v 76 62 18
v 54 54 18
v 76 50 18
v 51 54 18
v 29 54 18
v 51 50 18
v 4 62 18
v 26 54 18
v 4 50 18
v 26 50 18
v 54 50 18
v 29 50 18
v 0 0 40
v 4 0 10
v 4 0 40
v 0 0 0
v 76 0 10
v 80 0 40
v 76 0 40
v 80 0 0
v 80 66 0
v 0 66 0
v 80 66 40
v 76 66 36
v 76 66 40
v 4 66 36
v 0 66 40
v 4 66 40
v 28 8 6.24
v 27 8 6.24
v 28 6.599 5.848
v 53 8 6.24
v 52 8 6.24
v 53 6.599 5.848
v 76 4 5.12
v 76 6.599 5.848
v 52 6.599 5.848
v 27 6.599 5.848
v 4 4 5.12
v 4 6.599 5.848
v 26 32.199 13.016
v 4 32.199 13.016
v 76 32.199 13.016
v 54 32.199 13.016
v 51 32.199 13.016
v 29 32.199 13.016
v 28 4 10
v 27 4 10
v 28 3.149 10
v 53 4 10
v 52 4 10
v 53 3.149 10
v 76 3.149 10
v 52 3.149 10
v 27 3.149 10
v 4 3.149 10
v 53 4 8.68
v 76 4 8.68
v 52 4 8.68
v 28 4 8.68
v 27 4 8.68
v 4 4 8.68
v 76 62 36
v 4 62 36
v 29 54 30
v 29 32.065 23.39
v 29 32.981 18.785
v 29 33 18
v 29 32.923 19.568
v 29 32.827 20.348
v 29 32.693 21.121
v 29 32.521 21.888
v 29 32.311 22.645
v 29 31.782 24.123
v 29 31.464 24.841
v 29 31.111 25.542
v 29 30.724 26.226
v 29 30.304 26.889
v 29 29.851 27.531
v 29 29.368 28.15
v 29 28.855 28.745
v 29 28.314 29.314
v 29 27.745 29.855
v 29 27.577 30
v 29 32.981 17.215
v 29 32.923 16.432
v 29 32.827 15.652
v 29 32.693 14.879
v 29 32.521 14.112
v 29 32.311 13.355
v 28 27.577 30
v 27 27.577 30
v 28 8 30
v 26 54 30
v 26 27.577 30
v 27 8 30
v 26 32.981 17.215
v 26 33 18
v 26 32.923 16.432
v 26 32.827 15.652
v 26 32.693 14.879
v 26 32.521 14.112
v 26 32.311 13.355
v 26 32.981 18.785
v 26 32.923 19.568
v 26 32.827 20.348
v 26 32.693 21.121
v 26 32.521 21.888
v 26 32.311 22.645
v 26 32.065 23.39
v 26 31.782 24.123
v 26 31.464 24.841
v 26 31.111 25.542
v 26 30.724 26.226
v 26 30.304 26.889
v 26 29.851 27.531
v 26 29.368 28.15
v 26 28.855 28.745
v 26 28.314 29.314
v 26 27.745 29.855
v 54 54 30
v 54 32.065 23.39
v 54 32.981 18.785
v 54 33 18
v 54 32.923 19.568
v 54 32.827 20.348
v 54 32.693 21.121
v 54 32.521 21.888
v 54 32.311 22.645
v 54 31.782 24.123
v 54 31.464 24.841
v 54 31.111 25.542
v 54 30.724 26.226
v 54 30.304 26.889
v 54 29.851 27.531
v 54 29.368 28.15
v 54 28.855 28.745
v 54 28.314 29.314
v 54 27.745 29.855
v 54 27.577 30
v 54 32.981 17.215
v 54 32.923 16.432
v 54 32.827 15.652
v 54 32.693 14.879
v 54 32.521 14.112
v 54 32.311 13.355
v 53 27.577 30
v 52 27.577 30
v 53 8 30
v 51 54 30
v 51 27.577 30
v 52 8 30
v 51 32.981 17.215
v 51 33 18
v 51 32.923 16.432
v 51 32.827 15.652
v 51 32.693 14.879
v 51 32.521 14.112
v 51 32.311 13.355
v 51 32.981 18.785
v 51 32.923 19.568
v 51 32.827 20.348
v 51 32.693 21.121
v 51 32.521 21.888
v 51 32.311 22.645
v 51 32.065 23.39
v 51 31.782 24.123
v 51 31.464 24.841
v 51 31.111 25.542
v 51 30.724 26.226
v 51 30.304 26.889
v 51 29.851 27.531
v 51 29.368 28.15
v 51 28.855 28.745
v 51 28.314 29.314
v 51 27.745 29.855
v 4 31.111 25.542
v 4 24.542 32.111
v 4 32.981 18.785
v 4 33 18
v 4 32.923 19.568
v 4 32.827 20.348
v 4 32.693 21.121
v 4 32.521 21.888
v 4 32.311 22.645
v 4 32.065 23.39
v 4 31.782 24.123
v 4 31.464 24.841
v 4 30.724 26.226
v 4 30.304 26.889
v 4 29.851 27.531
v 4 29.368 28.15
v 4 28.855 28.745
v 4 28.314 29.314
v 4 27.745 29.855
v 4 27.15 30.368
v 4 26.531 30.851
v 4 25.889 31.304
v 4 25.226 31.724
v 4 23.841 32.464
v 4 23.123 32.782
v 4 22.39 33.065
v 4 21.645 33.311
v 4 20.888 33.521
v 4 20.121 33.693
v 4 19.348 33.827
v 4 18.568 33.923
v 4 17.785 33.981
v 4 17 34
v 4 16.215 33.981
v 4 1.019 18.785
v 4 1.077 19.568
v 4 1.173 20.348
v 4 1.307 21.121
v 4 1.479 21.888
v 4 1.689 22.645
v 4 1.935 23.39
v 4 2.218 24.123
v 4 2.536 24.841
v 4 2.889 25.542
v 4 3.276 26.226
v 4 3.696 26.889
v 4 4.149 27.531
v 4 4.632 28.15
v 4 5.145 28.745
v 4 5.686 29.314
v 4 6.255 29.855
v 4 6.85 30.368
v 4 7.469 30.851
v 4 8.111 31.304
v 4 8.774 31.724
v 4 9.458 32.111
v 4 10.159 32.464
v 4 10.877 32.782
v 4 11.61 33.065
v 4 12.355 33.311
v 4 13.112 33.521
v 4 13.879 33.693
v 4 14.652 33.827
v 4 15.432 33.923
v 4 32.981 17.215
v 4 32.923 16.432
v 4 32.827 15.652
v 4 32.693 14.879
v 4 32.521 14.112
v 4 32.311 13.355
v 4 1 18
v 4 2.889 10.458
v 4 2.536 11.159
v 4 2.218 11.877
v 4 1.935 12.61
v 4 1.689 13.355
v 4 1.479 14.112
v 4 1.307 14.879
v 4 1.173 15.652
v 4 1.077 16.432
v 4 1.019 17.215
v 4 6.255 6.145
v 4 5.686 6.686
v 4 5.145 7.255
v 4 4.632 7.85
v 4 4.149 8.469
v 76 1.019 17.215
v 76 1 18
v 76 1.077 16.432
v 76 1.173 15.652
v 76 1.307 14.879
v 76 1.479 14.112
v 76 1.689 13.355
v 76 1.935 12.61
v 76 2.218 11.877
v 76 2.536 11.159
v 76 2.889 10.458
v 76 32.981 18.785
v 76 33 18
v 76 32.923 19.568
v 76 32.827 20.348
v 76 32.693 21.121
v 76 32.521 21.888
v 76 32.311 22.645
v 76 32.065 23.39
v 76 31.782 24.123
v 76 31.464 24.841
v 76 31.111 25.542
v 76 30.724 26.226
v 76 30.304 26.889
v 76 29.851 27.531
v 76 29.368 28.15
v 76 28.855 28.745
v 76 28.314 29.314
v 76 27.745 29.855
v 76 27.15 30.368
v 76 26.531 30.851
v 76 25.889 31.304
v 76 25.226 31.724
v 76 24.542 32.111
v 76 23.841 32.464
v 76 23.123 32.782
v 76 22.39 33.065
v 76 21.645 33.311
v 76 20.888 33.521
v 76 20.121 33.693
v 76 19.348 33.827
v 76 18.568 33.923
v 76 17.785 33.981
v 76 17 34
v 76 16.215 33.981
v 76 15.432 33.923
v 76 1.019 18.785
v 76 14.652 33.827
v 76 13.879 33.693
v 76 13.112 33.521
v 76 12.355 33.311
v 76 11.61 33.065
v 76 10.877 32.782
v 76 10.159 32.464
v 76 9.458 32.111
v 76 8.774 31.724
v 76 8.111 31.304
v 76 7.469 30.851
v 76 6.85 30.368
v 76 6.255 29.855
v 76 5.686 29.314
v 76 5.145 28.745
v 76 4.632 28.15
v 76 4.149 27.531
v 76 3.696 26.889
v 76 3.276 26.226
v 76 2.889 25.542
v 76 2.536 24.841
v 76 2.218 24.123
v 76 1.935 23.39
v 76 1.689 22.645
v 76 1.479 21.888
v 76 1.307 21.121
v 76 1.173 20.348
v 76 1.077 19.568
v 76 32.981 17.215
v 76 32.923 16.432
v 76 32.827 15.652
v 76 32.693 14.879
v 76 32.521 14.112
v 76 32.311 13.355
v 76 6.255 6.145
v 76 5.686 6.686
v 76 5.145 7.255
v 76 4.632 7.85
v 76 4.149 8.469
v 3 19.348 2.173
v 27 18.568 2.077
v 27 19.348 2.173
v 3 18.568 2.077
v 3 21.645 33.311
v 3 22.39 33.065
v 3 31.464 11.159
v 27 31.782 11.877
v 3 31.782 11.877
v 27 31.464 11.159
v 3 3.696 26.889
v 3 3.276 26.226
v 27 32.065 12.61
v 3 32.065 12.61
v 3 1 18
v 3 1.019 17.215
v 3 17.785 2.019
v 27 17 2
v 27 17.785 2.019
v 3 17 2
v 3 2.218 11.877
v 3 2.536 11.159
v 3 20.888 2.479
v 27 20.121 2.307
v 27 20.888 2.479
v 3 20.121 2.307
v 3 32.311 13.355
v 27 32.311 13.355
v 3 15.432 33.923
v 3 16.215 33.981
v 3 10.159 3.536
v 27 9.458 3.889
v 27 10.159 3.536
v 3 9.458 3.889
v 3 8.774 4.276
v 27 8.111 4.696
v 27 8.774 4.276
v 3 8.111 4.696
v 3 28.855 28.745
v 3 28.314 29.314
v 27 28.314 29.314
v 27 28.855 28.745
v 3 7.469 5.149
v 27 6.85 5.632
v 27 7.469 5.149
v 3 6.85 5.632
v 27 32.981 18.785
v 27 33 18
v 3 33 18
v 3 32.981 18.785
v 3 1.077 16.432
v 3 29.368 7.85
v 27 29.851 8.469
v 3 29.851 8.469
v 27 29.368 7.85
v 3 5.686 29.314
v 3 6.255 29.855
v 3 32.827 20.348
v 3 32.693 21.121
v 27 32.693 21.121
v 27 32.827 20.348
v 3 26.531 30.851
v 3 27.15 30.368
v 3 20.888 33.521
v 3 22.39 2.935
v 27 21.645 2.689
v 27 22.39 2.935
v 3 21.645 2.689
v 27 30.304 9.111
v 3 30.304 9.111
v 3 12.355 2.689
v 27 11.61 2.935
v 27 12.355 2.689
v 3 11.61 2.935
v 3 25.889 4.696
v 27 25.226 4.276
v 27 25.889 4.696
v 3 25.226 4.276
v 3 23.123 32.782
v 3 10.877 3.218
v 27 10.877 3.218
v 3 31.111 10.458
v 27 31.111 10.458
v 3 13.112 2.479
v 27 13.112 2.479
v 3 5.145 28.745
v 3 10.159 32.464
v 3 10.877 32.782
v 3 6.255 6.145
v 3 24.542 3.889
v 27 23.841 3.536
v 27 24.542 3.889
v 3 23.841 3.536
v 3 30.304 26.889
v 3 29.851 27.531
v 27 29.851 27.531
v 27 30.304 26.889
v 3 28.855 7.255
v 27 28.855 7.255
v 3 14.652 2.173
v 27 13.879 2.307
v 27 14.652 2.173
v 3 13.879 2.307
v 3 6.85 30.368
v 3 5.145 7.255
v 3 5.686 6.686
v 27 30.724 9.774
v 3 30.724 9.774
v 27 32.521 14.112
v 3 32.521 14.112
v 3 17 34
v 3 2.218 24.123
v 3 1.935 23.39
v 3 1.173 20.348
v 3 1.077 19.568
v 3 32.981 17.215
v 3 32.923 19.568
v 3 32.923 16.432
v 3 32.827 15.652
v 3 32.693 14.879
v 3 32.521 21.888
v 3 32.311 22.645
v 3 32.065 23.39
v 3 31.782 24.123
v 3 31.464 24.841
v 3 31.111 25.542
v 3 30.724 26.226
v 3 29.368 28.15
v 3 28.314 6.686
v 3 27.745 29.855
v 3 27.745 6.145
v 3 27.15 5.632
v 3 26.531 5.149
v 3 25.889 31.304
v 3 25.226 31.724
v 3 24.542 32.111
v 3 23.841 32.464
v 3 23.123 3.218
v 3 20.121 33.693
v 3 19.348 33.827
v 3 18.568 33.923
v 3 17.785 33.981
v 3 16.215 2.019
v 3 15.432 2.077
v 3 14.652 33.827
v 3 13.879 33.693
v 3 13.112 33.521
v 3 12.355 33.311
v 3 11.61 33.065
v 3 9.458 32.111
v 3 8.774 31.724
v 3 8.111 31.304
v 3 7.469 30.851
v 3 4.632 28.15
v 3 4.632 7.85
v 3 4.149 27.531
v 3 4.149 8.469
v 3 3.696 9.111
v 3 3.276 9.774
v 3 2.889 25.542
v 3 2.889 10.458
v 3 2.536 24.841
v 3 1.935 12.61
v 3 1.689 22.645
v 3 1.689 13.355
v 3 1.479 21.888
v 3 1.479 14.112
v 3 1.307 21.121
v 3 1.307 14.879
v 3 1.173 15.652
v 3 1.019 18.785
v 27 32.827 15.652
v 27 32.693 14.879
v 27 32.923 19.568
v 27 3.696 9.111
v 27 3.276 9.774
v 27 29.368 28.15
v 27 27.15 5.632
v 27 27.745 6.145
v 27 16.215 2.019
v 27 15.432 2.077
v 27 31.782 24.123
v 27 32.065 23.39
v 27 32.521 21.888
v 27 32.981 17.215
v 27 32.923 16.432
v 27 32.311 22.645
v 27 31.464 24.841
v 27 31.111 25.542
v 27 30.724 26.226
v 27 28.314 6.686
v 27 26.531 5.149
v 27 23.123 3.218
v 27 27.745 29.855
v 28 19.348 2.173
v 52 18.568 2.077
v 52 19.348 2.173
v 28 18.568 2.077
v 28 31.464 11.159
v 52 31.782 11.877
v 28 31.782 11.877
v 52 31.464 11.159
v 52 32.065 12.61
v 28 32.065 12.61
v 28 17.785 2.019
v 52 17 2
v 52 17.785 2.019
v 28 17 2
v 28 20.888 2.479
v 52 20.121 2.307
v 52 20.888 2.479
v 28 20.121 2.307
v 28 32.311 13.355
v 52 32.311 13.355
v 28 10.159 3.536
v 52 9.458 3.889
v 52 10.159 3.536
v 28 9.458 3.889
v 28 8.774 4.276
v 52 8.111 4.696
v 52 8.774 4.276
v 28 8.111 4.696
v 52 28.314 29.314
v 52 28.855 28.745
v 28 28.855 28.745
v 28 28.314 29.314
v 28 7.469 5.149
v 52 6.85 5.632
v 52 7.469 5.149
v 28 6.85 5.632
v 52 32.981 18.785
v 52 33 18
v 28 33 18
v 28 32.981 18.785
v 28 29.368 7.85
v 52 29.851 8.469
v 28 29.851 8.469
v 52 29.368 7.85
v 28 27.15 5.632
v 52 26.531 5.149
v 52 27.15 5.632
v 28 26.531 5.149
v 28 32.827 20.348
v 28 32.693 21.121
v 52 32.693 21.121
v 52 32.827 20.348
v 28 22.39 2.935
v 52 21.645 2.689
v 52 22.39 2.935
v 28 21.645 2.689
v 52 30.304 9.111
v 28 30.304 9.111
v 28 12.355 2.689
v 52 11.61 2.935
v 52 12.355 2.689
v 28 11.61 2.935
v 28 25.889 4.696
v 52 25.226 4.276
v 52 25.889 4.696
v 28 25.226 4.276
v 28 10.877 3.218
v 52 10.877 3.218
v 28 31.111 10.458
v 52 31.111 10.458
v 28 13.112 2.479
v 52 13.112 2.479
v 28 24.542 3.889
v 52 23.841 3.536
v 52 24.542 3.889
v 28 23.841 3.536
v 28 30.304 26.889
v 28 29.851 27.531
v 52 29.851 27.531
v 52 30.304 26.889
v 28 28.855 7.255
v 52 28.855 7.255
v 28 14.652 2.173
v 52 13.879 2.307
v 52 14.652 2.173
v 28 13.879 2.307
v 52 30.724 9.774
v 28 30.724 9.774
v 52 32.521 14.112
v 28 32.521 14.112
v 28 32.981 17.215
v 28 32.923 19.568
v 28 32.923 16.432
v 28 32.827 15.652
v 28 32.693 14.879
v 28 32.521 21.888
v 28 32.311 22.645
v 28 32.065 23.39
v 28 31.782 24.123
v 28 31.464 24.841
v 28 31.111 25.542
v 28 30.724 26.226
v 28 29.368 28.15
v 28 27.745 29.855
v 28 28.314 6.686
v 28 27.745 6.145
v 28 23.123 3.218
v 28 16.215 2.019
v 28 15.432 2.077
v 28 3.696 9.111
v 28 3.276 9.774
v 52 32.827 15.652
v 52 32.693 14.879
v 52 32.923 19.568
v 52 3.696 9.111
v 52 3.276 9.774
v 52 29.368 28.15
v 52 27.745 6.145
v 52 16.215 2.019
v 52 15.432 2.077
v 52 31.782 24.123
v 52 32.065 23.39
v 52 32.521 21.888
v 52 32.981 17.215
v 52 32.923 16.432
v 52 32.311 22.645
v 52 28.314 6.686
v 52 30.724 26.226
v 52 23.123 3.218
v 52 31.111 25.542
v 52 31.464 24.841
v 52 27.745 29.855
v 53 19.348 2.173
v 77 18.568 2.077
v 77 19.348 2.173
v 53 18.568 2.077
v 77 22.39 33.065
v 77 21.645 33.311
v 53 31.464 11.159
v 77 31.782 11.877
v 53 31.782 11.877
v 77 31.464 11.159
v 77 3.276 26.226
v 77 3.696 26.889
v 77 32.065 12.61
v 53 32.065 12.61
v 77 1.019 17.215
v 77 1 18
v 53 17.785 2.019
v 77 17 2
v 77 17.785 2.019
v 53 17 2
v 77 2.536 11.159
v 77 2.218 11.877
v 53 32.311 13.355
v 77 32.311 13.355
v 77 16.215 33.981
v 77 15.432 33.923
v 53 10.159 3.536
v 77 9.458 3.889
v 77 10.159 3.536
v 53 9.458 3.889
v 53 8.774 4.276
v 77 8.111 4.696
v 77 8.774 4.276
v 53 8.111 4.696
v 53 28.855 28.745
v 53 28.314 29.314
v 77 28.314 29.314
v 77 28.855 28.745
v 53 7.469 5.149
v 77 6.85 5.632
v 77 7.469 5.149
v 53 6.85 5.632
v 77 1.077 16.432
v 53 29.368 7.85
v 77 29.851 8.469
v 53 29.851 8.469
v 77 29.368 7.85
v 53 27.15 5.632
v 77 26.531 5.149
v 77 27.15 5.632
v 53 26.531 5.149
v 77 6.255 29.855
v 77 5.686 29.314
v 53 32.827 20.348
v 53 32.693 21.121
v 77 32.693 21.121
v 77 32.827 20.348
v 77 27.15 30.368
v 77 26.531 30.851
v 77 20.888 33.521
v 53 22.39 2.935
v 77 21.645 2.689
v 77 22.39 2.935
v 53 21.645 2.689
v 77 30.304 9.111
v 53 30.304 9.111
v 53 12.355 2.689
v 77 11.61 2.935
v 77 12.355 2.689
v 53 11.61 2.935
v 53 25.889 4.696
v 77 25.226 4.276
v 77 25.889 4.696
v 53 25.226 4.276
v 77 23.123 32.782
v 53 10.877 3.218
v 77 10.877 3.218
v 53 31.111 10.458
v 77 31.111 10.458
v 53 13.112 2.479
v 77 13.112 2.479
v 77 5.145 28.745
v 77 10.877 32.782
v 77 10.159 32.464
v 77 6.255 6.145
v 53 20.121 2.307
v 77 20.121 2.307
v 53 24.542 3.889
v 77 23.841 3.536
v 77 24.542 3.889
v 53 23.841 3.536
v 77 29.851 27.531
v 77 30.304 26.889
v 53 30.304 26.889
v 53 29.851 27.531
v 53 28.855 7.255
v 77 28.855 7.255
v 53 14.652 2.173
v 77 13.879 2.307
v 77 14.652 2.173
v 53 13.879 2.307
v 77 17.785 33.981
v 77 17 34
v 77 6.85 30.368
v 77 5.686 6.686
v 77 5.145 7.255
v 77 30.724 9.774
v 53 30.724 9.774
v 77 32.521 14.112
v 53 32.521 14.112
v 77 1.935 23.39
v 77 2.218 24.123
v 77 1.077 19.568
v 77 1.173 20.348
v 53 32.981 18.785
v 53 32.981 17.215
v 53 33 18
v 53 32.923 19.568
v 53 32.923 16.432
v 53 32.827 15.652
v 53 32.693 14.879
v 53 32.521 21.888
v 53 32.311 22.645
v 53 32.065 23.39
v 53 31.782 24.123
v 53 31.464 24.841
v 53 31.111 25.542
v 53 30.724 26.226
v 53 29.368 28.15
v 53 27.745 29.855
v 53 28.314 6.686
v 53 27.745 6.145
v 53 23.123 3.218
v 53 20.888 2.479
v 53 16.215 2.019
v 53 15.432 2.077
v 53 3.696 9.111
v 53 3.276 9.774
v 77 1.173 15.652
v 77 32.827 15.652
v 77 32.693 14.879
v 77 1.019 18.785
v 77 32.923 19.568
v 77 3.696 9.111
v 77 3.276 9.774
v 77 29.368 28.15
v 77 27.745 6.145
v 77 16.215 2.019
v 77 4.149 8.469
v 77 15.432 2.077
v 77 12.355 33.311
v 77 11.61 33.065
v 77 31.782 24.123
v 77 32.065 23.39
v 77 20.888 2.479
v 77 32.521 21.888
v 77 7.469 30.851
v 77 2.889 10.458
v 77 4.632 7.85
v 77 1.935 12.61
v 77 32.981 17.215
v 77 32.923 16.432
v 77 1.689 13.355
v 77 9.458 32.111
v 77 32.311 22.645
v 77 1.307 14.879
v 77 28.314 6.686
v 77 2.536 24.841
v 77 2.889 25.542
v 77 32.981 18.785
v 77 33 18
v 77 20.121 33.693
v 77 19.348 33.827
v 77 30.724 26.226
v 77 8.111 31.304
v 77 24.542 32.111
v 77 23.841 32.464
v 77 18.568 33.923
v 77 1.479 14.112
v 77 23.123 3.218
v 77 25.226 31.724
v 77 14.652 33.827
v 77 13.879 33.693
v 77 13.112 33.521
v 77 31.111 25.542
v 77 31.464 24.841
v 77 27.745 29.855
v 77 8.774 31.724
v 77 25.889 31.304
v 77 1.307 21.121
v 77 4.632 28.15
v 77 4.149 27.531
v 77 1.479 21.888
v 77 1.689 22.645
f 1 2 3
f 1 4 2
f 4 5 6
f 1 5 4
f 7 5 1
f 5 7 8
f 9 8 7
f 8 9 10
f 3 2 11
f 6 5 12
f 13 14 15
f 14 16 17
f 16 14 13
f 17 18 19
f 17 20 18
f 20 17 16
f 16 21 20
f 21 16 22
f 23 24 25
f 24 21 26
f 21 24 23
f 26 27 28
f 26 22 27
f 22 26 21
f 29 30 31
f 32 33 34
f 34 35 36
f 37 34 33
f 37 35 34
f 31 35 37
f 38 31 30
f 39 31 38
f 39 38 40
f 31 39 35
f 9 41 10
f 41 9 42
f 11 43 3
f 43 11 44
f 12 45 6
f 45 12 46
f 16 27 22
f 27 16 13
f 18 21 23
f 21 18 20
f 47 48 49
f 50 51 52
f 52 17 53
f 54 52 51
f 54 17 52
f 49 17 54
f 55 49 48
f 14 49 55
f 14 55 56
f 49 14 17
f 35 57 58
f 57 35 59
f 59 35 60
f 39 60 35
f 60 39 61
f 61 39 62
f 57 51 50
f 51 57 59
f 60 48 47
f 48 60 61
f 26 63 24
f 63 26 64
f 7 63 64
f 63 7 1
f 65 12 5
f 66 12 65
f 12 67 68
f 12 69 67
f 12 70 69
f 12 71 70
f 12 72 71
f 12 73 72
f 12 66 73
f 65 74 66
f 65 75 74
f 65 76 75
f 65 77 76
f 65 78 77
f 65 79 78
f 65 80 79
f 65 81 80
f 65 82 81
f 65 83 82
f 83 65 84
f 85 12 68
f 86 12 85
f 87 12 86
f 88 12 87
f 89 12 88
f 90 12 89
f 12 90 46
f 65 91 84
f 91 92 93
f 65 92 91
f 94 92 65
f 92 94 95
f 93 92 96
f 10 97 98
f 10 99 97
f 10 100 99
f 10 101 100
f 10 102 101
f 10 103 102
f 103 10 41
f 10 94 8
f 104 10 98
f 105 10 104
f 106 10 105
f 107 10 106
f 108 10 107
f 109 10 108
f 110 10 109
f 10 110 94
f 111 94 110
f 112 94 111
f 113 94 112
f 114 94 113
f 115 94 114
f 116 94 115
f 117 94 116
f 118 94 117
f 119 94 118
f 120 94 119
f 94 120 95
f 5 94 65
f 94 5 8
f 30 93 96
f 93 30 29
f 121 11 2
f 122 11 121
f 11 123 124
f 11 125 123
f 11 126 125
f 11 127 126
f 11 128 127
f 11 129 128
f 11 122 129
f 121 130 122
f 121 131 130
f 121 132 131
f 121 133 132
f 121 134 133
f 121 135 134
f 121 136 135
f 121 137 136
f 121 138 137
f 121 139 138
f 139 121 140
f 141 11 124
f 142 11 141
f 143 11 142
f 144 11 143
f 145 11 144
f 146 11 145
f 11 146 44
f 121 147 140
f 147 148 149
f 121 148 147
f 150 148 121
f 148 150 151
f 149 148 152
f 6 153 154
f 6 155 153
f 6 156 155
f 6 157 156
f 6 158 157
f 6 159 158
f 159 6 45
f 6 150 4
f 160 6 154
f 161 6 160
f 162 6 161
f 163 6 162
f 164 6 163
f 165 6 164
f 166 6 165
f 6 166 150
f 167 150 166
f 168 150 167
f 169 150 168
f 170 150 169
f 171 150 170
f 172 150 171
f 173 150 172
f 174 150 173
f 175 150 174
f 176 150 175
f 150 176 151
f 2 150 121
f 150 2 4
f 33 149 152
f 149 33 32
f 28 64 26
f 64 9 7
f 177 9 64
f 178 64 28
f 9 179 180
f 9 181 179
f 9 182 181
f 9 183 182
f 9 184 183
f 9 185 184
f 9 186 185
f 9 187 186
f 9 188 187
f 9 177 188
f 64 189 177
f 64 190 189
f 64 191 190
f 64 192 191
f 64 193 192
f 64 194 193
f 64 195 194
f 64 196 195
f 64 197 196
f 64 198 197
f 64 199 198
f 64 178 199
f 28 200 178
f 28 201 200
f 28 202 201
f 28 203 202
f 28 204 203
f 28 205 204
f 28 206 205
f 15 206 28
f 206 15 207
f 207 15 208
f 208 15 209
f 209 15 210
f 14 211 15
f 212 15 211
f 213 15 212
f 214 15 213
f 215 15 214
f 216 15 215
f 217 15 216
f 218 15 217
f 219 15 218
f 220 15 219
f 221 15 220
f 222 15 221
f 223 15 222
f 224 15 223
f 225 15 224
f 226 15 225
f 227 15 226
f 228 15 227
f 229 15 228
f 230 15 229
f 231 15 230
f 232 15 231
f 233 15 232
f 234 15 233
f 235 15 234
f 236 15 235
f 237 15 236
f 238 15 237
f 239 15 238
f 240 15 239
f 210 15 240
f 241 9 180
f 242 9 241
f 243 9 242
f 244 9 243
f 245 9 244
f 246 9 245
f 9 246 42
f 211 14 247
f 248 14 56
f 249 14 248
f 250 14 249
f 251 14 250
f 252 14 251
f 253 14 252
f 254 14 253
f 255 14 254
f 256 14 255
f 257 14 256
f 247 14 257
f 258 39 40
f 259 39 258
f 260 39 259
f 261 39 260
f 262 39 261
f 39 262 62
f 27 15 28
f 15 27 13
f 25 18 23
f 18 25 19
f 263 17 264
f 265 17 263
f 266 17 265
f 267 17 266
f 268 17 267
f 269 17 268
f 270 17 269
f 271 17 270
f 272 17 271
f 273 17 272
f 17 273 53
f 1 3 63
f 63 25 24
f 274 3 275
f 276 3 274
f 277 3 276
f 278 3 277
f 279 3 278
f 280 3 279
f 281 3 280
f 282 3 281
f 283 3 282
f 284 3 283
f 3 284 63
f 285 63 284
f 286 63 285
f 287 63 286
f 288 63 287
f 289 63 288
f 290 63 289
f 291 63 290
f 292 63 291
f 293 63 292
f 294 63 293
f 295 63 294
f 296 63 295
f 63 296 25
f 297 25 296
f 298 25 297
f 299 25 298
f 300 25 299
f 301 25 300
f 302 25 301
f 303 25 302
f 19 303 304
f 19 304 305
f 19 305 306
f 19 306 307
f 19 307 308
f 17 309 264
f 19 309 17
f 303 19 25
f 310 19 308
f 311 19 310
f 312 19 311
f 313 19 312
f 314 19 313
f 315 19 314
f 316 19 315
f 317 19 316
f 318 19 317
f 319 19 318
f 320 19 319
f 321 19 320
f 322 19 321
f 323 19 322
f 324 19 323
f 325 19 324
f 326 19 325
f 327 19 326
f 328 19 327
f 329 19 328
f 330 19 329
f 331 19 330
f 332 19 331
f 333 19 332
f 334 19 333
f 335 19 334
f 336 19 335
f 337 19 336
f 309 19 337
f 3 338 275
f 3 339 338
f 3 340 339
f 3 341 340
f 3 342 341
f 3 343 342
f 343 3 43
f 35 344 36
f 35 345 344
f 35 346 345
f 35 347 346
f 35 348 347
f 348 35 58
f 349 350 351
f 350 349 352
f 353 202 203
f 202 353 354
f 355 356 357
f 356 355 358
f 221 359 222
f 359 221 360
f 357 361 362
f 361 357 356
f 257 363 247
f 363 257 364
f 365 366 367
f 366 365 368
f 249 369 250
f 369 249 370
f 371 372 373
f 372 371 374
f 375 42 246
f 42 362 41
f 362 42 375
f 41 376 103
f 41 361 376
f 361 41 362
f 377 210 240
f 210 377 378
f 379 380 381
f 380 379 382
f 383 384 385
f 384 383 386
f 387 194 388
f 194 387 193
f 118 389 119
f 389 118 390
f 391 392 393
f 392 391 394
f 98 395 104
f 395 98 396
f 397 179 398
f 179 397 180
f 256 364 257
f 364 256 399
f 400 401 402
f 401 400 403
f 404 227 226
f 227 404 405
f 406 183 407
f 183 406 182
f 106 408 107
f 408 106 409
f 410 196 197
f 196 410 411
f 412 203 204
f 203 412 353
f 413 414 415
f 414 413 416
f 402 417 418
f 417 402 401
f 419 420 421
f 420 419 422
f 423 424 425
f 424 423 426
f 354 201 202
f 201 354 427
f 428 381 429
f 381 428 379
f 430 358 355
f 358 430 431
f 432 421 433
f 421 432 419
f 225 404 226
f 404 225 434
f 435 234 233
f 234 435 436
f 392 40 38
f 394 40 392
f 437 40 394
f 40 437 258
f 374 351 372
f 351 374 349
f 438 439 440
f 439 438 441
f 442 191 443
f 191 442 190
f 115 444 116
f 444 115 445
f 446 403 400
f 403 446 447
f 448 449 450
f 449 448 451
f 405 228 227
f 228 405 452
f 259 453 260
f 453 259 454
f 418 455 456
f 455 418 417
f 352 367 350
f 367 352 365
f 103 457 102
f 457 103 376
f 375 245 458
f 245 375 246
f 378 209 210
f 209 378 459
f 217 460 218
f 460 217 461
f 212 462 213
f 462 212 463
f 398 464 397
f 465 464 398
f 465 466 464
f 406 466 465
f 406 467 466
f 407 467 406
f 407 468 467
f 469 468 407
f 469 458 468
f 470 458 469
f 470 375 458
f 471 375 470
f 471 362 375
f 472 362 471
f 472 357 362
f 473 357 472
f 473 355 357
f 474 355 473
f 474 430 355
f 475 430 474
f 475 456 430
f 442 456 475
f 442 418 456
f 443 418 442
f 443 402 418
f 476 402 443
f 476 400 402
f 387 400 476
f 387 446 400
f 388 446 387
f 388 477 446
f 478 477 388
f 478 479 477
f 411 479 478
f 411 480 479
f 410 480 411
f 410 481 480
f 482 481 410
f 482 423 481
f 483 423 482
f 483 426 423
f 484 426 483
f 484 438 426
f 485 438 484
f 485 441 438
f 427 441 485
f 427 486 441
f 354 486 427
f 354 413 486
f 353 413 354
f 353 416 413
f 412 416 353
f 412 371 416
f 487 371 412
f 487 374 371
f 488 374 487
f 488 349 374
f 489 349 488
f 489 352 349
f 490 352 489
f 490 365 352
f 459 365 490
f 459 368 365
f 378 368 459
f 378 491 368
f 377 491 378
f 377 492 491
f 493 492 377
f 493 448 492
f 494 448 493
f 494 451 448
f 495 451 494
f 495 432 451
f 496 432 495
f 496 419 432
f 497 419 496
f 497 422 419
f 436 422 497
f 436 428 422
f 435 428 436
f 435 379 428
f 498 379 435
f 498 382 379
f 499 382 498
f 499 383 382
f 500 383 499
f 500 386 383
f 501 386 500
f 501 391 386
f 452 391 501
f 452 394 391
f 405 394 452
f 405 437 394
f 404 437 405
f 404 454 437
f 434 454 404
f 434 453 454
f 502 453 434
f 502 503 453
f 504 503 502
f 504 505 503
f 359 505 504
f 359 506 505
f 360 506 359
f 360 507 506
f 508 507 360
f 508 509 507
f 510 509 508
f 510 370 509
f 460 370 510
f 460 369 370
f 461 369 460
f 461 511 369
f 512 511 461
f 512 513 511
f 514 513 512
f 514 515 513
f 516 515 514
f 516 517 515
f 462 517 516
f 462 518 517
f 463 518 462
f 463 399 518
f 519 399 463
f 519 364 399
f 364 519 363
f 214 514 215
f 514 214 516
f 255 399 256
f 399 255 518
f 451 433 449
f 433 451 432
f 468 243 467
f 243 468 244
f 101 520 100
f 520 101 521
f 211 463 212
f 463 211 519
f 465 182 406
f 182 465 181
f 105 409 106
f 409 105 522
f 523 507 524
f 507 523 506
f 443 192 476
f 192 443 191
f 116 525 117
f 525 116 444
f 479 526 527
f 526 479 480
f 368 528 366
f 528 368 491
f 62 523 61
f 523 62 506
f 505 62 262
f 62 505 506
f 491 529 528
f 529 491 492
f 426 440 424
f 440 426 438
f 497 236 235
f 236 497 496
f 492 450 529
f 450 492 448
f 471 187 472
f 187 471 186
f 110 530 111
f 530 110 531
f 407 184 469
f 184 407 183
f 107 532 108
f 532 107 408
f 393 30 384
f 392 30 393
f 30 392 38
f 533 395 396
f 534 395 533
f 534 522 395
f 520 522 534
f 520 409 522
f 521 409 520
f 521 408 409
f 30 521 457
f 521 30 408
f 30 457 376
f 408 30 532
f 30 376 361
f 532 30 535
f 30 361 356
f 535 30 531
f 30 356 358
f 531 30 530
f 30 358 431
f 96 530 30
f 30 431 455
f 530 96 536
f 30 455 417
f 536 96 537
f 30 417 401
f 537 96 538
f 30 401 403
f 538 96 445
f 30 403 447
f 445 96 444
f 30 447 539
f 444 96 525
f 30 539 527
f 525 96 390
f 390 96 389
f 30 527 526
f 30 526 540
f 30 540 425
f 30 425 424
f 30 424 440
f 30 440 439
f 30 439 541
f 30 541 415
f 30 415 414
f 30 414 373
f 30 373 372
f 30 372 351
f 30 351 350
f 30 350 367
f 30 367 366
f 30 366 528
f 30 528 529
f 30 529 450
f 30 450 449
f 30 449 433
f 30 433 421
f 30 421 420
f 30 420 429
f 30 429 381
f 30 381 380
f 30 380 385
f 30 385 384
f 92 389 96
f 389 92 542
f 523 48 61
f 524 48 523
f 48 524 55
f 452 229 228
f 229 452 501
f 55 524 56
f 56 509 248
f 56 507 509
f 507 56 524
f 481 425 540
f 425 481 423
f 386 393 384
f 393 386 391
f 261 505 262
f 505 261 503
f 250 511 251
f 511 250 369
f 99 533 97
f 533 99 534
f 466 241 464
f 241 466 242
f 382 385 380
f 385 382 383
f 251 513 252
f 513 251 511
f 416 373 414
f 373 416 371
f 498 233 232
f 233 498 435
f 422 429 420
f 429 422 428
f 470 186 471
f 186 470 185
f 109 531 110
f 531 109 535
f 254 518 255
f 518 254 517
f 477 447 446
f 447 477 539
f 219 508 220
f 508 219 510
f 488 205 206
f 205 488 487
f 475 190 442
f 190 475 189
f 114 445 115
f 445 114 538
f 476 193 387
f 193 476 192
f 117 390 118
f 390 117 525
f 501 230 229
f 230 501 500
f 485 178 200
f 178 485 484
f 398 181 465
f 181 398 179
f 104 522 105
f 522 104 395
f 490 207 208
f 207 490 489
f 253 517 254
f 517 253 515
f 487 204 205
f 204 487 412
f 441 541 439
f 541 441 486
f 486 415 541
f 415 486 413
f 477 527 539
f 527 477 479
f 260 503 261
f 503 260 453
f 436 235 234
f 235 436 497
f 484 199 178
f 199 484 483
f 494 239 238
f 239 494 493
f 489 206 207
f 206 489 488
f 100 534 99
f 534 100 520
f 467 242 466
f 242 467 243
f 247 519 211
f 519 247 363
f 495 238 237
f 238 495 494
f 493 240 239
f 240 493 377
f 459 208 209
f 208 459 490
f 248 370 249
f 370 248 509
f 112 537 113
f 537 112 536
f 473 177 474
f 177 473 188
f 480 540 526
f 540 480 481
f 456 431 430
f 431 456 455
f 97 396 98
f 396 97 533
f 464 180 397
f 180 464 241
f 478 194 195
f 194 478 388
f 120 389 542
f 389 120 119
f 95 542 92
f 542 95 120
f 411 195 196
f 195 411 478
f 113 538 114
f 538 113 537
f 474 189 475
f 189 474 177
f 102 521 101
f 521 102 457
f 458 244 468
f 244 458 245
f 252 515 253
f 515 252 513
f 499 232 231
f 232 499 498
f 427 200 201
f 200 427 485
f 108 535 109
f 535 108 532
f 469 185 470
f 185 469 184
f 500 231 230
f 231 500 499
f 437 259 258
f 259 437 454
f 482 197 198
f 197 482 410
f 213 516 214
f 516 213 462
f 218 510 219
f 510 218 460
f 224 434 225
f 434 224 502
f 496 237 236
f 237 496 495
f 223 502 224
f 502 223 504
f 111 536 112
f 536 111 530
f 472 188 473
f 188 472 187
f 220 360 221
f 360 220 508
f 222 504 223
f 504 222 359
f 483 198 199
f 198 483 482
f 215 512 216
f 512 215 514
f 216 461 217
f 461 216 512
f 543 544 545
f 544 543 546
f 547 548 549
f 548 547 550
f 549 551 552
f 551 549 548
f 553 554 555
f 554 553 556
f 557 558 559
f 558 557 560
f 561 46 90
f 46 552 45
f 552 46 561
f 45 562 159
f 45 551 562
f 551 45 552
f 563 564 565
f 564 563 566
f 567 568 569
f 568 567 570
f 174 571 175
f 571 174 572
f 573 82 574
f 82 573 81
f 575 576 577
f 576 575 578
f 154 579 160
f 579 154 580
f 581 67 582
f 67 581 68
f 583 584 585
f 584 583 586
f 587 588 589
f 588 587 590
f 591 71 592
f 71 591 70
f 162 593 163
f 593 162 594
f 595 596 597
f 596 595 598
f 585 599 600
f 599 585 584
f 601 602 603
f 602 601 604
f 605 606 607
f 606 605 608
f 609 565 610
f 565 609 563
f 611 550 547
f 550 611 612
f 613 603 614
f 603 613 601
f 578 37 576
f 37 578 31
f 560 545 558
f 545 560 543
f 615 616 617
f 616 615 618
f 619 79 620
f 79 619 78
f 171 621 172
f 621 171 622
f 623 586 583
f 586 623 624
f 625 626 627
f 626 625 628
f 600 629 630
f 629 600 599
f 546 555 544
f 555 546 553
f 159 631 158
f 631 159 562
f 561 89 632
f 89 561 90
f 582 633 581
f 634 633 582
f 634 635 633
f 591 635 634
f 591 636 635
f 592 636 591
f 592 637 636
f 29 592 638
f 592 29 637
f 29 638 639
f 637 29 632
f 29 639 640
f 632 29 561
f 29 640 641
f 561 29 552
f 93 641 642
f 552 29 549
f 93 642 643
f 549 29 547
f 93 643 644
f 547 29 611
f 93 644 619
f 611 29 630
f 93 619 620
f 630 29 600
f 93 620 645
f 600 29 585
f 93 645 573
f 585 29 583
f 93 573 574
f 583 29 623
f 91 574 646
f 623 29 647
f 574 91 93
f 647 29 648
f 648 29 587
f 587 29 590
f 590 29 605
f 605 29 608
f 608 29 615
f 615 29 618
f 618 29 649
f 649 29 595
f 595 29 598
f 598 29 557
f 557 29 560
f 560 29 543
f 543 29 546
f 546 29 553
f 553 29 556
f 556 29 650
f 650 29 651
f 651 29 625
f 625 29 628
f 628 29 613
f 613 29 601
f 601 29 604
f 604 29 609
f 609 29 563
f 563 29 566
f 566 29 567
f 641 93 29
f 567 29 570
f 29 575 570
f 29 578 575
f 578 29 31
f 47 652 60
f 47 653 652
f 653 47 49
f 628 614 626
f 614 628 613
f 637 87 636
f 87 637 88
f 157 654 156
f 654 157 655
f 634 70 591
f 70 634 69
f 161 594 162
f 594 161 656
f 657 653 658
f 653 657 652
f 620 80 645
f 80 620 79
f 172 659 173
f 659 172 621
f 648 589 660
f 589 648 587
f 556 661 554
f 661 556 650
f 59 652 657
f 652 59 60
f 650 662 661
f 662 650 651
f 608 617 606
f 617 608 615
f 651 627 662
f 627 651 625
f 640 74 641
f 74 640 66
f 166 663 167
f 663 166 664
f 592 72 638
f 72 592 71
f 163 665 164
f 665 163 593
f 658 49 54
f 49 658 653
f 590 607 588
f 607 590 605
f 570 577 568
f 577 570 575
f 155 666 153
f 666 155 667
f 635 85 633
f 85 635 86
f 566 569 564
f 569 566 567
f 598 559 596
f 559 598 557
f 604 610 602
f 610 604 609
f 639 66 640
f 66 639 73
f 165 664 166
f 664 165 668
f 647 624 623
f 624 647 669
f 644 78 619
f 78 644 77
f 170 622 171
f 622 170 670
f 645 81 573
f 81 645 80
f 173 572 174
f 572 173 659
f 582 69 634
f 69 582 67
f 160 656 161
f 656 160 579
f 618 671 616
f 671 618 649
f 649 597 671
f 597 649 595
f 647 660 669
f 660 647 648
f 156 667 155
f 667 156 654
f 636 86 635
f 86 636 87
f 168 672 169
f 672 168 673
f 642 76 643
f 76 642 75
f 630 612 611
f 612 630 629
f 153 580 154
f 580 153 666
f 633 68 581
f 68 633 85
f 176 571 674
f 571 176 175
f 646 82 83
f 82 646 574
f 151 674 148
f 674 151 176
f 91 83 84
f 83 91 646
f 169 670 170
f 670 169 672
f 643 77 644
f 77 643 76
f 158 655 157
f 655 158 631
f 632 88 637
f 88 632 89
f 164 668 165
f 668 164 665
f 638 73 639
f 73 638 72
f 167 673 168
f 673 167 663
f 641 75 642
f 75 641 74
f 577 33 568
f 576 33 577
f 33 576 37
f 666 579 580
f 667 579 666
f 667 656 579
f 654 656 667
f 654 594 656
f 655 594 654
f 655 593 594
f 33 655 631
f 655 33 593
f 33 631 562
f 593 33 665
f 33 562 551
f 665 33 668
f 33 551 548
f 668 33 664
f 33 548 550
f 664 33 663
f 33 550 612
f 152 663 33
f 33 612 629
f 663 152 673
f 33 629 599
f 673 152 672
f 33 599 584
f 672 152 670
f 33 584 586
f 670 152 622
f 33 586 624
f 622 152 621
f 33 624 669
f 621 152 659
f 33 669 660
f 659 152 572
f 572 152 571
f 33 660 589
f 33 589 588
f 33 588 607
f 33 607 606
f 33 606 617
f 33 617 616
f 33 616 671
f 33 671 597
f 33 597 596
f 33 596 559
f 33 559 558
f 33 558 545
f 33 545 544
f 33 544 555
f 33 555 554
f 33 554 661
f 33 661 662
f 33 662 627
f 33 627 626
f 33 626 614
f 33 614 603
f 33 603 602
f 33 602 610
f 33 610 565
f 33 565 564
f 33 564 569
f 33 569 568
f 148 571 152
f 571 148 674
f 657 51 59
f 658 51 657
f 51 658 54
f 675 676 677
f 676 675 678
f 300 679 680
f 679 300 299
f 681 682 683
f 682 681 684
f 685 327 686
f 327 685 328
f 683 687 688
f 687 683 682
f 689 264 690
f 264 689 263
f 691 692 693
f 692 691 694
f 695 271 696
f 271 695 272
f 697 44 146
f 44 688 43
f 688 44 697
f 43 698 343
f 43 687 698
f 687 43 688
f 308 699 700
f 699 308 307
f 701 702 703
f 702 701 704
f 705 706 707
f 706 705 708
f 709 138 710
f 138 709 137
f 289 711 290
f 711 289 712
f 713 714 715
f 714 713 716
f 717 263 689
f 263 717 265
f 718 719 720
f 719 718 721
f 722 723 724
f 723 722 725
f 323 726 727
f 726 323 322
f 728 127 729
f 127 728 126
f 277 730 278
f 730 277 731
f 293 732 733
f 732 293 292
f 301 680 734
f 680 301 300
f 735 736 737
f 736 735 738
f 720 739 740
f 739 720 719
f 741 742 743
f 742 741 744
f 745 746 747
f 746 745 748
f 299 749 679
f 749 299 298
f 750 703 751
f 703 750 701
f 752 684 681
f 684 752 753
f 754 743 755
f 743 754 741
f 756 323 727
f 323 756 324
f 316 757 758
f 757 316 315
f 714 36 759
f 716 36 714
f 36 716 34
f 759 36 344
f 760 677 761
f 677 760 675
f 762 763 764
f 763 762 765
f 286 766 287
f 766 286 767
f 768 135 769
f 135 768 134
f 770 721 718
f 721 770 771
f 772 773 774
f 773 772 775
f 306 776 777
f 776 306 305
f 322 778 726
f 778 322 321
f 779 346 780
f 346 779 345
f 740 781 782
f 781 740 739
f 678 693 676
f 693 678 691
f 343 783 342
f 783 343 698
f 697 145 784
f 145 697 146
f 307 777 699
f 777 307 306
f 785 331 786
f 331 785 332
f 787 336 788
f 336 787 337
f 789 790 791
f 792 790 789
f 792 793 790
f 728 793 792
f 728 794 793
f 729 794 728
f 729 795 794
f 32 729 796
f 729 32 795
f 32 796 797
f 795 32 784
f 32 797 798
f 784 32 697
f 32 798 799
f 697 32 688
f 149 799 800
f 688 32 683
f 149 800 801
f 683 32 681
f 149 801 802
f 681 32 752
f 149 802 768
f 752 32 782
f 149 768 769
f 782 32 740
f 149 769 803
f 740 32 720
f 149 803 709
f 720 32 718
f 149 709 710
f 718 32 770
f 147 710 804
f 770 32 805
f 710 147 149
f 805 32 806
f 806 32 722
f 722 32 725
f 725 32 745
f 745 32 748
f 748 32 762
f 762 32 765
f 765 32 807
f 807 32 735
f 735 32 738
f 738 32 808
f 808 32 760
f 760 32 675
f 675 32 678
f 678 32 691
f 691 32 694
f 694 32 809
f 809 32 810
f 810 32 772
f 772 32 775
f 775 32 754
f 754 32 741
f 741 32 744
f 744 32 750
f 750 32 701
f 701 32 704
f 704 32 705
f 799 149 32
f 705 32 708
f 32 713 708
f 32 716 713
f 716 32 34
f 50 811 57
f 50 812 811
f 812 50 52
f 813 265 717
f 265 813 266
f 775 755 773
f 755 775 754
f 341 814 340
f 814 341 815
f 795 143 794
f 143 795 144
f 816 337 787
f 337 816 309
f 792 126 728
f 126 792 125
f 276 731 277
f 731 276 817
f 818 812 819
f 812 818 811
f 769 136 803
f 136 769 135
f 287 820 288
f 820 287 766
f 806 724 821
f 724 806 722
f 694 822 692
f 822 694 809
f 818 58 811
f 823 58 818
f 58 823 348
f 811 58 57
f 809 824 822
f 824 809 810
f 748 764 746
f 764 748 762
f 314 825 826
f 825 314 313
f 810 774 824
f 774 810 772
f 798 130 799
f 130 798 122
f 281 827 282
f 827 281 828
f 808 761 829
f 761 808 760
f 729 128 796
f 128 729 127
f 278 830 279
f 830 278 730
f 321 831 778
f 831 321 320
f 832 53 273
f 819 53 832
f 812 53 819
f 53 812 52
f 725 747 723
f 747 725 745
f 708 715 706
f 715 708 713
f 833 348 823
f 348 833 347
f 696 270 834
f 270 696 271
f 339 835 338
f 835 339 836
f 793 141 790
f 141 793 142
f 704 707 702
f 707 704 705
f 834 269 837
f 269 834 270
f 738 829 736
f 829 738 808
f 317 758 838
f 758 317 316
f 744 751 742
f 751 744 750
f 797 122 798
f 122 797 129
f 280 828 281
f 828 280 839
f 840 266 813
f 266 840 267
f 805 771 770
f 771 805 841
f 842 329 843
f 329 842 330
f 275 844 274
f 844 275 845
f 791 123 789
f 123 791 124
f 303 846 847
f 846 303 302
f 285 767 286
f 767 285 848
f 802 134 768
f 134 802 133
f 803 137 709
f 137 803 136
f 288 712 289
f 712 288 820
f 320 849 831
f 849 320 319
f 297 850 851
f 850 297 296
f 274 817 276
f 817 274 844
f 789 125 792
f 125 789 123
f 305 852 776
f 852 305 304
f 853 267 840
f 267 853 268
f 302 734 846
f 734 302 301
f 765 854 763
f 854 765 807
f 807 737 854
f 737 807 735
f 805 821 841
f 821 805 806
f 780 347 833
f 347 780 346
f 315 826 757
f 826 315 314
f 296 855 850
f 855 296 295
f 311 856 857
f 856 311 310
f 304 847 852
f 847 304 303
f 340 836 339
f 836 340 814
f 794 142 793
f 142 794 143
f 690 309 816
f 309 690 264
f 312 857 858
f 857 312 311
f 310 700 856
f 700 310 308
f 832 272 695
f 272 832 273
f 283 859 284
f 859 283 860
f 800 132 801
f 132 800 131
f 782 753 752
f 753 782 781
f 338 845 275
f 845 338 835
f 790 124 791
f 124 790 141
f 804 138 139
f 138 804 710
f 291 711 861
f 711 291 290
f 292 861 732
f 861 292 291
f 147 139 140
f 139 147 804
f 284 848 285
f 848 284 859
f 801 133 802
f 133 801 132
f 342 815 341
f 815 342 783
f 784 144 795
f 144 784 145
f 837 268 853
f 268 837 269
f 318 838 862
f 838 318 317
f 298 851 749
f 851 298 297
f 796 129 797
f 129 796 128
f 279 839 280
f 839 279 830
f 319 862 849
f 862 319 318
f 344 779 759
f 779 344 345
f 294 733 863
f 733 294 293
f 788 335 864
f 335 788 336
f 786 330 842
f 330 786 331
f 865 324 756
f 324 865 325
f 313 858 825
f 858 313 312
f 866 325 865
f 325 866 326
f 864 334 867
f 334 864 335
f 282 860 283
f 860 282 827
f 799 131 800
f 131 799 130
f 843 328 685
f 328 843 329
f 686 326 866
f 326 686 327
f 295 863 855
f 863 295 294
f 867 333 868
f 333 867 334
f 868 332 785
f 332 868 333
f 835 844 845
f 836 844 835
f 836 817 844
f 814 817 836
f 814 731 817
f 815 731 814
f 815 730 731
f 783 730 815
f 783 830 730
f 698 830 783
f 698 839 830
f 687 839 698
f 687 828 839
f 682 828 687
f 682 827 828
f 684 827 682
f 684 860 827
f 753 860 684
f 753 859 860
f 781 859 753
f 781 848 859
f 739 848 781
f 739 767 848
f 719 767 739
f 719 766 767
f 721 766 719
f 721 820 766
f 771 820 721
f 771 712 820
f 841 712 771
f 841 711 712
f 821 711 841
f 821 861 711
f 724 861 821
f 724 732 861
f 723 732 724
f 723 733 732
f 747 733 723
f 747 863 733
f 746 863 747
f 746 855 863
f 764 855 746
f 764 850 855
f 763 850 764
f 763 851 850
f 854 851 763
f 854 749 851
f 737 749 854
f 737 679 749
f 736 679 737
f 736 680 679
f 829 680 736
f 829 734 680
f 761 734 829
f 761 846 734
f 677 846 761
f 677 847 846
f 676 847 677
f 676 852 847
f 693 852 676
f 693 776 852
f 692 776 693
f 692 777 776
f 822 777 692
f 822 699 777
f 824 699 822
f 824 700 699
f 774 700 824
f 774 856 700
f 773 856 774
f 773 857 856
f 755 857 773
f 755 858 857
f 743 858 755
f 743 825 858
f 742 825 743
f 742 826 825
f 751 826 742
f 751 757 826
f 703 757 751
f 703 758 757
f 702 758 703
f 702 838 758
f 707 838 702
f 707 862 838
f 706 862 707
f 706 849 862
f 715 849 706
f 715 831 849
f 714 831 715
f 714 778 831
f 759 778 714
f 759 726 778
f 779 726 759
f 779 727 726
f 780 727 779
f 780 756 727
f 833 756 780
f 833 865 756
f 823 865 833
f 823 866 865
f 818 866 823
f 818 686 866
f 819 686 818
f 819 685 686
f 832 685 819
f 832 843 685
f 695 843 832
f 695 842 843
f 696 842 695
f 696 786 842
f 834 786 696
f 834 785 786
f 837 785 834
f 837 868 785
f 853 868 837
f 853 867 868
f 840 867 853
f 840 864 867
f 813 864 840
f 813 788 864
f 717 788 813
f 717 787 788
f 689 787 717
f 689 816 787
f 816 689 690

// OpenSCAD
// file: ../../common/utils.scad
// Common utilities and shared variables
// Include this file at the top of your models:
//   include <../../common/utils.scad>

// ── Units ────────────────────────────────────────────────────────────────────
// All dimensions in millimeters

// ── Print tolerances ─────────────────────────────────────────────────────────
// Gap to add when two parts need to fit together (e.g., peg into a hole)
FIT_CLEARANCE = 0.2;  // mm

// Tolerance for press-fit / tight connections
PRESS_FIT = 0.1;  // mm

// ── Quality settings ─────────────────────────────────────────────────────────
// Override per-model if needed
$fn = $preview ? 32 : 128;  // Circle/sphere resolution

// ── Common layer heights ──────────────────────────────────────────────────────
LAYER_HEIGHT      = 0.2;   // standard
FIRST_LAYER       = 0.3;   // slightly thicker first layer
MIN_WALL          = 0.4;   // single extrusion width (0.4 mm nozzle)
// main file
// Concept 2A: compact leaning cradle tray.
// Smaller footprint for limited counter/cabinet depth.
//
// Usage:
//   openscad -o 02a-leaning-cradle-tray-compact.stl 02a-leaning-cradle-tray-compact.scad

include <../../common/utils.scad>

lid_d = 78;
lid_h = 44;

n_lids = 3;
slot_gap = 22;
divider_t = 3;
side_wall = 4;
base_t = 4;
tray_depth = 66;
rear_band = 16;
rear_rise = 14;
rear_wall_h = 22;
front_lip_h = 10;
divider_h = 26;
cradle_r = 16;
cradle_z = 18;
cradle_y = 17;

total_w = 2 * side_wall + n_lids * slot_gap + (n_lids - 1) * divider_t;

module tray_shell() {
    union() {
        hull() {
            cube([total_w, tray_depth, base_t]);
            translate([0, tray_depth - rear_band, rear_rise])
                cube([total_w, rear_band, base_t]);
        }

        cube([total_w, 4, front_lip_h]);

        translate([0, tray_depth - 4, rear_rise])
            cube([total_w, 4, rear_wall_h]);
    }
}

difference() {
    union() {
        tray_shell();

        for (divider_index = [1 : n_lids - 1]) {
            divider_x = side_wall + divider_index * slot_gap + (divider_index - 1) * divider_t;
            translate([divider_x, 8, base_t])
                cube([divider_t, tray_depth - 20, divider_h]);
        }

        translate([0, 0, base_t])
            cube([side_wall, tray_depth, rear_rise + rear_wall_h]);

        translate([total_w - side_wall, 0, base_t])
            cube([side_wall, tray_depth, rear_rise + rear_wall_h]);
    }

    for (slot_index = [0 : n_lids - 1]) {
        slot_x = side_wall + slot_index * (slot_gap + divider_t);
        translate([slot_x - 1, cradle_y, cradle_z])
            rotate([0, 90, 0])
                cylinder(h = slot_gap + 2, r = cradle_r);
    }
}
